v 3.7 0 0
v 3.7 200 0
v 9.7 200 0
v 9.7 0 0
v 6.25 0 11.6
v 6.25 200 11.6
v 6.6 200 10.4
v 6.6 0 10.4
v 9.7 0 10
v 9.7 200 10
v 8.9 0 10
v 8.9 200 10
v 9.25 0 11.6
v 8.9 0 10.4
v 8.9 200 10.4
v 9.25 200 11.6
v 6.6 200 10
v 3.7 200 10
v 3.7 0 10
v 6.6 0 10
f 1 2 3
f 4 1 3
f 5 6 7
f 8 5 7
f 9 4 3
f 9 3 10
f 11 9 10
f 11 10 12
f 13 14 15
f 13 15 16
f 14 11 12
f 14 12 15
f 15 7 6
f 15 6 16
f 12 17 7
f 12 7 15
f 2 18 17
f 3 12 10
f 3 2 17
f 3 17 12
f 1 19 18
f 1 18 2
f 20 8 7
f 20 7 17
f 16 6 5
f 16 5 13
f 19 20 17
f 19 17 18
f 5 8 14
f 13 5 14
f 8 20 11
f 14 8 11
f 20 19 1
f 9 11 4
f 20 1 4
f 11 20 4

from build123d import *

# Parameters (mm, degrees)
BOX_W                  = 70
BOX_H                  = 200
BOX_DEPTH              = 11.6
POCKET_DEPTH           = 200.001
LINEARPATTERN_COUNT    = 5
LINEARPATTERN_PITCH    = 14.5
SKETCH_W               = 82.408782
SKETCH_H               = 38.885188
SKETCH_W_2             = 6
SKETCH_H_2             = 21.094656
POCKET001_DEPTH        = 200.001
SKETCH003_R            = 1
POCKET002_DEPTH        = 5.201
LINEARPATTERN001_COUNT = 3
LINEARPATTERN001_PITCH = 15


with BuildPart() as part:
    # Box → Box (new body)
    with BuildSketch(Plane(origin=(-7.5, 0, 0), x_dir=(1, 0, 0), z_dir=(0, 0, 1))):
        with Locations((35, 100)):
            Rectangle(BOX_W, BOX_H)
    extrude(amount=BOX_DEPTH)

    # Sketch002 → Pocket (cut, through all)
    with BuildSketch(Plane(origin=(-7.5, 0, 0), x_dir=(1, 0, 0), z_dir=(0, -1, 0))):
        Polygon((14.1, 10), (11.2, 10), (11.2, 3), (2.7, 3), (2.7, 10), (1.9, 10), (1.9, 10.4), (2.25, 11.6), (13.75, 11.6), (14.1, 10.4), align=None)
    pocket = extrude(amount=-POCKET_DEPTH, mode=Mode.SUBTRACT)

    # LinearPattern: Pocket ×5
    with Locations(*[(i * LINEARPATTERN_PITCH, 0, 0) for i in range(1, LINEARPATTERN_COUNT)]):
        add(pocket, mode=Mode.SUBTRACT)

    # Sketch → Pocket001 (cut, through all)
    with BuildSketch(Plane(origin=(-7.5, 0, 0), x_dir=(1, 0, 0), z_dir=(0, -1, 0))):
        with Locations((35.413628, 6.289411)):
            Rectangle(SKETCH_W, SKETCH_H)
        with Locations((14.2, 4.644143)):
            Rectangle(SKETCH_W_2, SKETCH_H_2, mode=Mode.SUBTRACT)
    extrude(amount=-POCKET001_DEPTH, mode=Mode.SUBTRACT)

    # Sketch003 → Pocket002 (cut, through all)
    with BuildSketch(Plane.YZ.offset(8.9)):
        with Locations((21.45, -100)):
            Circle(SKETCH003_R)
        with Locations((21.45, -10)):
            Circle(SKETCH003_R)
        with Locations((21.45, -190)):
            Circle(SKETCH003_R)
    pocket002 = extrude(amount=-POCKET002_DEPTH, mode=Mode.SUBTRACT)

    # LinearPattern001: Pocket002 ×3
    with Locations(*[(0, i * LINEARPATTERN001_PITCH, 0) for i in range(1, LINEARPATTERN001_COUNT)]):
        add(pocket002, mode=Mode.SUBTRACT)


solid = part.part
